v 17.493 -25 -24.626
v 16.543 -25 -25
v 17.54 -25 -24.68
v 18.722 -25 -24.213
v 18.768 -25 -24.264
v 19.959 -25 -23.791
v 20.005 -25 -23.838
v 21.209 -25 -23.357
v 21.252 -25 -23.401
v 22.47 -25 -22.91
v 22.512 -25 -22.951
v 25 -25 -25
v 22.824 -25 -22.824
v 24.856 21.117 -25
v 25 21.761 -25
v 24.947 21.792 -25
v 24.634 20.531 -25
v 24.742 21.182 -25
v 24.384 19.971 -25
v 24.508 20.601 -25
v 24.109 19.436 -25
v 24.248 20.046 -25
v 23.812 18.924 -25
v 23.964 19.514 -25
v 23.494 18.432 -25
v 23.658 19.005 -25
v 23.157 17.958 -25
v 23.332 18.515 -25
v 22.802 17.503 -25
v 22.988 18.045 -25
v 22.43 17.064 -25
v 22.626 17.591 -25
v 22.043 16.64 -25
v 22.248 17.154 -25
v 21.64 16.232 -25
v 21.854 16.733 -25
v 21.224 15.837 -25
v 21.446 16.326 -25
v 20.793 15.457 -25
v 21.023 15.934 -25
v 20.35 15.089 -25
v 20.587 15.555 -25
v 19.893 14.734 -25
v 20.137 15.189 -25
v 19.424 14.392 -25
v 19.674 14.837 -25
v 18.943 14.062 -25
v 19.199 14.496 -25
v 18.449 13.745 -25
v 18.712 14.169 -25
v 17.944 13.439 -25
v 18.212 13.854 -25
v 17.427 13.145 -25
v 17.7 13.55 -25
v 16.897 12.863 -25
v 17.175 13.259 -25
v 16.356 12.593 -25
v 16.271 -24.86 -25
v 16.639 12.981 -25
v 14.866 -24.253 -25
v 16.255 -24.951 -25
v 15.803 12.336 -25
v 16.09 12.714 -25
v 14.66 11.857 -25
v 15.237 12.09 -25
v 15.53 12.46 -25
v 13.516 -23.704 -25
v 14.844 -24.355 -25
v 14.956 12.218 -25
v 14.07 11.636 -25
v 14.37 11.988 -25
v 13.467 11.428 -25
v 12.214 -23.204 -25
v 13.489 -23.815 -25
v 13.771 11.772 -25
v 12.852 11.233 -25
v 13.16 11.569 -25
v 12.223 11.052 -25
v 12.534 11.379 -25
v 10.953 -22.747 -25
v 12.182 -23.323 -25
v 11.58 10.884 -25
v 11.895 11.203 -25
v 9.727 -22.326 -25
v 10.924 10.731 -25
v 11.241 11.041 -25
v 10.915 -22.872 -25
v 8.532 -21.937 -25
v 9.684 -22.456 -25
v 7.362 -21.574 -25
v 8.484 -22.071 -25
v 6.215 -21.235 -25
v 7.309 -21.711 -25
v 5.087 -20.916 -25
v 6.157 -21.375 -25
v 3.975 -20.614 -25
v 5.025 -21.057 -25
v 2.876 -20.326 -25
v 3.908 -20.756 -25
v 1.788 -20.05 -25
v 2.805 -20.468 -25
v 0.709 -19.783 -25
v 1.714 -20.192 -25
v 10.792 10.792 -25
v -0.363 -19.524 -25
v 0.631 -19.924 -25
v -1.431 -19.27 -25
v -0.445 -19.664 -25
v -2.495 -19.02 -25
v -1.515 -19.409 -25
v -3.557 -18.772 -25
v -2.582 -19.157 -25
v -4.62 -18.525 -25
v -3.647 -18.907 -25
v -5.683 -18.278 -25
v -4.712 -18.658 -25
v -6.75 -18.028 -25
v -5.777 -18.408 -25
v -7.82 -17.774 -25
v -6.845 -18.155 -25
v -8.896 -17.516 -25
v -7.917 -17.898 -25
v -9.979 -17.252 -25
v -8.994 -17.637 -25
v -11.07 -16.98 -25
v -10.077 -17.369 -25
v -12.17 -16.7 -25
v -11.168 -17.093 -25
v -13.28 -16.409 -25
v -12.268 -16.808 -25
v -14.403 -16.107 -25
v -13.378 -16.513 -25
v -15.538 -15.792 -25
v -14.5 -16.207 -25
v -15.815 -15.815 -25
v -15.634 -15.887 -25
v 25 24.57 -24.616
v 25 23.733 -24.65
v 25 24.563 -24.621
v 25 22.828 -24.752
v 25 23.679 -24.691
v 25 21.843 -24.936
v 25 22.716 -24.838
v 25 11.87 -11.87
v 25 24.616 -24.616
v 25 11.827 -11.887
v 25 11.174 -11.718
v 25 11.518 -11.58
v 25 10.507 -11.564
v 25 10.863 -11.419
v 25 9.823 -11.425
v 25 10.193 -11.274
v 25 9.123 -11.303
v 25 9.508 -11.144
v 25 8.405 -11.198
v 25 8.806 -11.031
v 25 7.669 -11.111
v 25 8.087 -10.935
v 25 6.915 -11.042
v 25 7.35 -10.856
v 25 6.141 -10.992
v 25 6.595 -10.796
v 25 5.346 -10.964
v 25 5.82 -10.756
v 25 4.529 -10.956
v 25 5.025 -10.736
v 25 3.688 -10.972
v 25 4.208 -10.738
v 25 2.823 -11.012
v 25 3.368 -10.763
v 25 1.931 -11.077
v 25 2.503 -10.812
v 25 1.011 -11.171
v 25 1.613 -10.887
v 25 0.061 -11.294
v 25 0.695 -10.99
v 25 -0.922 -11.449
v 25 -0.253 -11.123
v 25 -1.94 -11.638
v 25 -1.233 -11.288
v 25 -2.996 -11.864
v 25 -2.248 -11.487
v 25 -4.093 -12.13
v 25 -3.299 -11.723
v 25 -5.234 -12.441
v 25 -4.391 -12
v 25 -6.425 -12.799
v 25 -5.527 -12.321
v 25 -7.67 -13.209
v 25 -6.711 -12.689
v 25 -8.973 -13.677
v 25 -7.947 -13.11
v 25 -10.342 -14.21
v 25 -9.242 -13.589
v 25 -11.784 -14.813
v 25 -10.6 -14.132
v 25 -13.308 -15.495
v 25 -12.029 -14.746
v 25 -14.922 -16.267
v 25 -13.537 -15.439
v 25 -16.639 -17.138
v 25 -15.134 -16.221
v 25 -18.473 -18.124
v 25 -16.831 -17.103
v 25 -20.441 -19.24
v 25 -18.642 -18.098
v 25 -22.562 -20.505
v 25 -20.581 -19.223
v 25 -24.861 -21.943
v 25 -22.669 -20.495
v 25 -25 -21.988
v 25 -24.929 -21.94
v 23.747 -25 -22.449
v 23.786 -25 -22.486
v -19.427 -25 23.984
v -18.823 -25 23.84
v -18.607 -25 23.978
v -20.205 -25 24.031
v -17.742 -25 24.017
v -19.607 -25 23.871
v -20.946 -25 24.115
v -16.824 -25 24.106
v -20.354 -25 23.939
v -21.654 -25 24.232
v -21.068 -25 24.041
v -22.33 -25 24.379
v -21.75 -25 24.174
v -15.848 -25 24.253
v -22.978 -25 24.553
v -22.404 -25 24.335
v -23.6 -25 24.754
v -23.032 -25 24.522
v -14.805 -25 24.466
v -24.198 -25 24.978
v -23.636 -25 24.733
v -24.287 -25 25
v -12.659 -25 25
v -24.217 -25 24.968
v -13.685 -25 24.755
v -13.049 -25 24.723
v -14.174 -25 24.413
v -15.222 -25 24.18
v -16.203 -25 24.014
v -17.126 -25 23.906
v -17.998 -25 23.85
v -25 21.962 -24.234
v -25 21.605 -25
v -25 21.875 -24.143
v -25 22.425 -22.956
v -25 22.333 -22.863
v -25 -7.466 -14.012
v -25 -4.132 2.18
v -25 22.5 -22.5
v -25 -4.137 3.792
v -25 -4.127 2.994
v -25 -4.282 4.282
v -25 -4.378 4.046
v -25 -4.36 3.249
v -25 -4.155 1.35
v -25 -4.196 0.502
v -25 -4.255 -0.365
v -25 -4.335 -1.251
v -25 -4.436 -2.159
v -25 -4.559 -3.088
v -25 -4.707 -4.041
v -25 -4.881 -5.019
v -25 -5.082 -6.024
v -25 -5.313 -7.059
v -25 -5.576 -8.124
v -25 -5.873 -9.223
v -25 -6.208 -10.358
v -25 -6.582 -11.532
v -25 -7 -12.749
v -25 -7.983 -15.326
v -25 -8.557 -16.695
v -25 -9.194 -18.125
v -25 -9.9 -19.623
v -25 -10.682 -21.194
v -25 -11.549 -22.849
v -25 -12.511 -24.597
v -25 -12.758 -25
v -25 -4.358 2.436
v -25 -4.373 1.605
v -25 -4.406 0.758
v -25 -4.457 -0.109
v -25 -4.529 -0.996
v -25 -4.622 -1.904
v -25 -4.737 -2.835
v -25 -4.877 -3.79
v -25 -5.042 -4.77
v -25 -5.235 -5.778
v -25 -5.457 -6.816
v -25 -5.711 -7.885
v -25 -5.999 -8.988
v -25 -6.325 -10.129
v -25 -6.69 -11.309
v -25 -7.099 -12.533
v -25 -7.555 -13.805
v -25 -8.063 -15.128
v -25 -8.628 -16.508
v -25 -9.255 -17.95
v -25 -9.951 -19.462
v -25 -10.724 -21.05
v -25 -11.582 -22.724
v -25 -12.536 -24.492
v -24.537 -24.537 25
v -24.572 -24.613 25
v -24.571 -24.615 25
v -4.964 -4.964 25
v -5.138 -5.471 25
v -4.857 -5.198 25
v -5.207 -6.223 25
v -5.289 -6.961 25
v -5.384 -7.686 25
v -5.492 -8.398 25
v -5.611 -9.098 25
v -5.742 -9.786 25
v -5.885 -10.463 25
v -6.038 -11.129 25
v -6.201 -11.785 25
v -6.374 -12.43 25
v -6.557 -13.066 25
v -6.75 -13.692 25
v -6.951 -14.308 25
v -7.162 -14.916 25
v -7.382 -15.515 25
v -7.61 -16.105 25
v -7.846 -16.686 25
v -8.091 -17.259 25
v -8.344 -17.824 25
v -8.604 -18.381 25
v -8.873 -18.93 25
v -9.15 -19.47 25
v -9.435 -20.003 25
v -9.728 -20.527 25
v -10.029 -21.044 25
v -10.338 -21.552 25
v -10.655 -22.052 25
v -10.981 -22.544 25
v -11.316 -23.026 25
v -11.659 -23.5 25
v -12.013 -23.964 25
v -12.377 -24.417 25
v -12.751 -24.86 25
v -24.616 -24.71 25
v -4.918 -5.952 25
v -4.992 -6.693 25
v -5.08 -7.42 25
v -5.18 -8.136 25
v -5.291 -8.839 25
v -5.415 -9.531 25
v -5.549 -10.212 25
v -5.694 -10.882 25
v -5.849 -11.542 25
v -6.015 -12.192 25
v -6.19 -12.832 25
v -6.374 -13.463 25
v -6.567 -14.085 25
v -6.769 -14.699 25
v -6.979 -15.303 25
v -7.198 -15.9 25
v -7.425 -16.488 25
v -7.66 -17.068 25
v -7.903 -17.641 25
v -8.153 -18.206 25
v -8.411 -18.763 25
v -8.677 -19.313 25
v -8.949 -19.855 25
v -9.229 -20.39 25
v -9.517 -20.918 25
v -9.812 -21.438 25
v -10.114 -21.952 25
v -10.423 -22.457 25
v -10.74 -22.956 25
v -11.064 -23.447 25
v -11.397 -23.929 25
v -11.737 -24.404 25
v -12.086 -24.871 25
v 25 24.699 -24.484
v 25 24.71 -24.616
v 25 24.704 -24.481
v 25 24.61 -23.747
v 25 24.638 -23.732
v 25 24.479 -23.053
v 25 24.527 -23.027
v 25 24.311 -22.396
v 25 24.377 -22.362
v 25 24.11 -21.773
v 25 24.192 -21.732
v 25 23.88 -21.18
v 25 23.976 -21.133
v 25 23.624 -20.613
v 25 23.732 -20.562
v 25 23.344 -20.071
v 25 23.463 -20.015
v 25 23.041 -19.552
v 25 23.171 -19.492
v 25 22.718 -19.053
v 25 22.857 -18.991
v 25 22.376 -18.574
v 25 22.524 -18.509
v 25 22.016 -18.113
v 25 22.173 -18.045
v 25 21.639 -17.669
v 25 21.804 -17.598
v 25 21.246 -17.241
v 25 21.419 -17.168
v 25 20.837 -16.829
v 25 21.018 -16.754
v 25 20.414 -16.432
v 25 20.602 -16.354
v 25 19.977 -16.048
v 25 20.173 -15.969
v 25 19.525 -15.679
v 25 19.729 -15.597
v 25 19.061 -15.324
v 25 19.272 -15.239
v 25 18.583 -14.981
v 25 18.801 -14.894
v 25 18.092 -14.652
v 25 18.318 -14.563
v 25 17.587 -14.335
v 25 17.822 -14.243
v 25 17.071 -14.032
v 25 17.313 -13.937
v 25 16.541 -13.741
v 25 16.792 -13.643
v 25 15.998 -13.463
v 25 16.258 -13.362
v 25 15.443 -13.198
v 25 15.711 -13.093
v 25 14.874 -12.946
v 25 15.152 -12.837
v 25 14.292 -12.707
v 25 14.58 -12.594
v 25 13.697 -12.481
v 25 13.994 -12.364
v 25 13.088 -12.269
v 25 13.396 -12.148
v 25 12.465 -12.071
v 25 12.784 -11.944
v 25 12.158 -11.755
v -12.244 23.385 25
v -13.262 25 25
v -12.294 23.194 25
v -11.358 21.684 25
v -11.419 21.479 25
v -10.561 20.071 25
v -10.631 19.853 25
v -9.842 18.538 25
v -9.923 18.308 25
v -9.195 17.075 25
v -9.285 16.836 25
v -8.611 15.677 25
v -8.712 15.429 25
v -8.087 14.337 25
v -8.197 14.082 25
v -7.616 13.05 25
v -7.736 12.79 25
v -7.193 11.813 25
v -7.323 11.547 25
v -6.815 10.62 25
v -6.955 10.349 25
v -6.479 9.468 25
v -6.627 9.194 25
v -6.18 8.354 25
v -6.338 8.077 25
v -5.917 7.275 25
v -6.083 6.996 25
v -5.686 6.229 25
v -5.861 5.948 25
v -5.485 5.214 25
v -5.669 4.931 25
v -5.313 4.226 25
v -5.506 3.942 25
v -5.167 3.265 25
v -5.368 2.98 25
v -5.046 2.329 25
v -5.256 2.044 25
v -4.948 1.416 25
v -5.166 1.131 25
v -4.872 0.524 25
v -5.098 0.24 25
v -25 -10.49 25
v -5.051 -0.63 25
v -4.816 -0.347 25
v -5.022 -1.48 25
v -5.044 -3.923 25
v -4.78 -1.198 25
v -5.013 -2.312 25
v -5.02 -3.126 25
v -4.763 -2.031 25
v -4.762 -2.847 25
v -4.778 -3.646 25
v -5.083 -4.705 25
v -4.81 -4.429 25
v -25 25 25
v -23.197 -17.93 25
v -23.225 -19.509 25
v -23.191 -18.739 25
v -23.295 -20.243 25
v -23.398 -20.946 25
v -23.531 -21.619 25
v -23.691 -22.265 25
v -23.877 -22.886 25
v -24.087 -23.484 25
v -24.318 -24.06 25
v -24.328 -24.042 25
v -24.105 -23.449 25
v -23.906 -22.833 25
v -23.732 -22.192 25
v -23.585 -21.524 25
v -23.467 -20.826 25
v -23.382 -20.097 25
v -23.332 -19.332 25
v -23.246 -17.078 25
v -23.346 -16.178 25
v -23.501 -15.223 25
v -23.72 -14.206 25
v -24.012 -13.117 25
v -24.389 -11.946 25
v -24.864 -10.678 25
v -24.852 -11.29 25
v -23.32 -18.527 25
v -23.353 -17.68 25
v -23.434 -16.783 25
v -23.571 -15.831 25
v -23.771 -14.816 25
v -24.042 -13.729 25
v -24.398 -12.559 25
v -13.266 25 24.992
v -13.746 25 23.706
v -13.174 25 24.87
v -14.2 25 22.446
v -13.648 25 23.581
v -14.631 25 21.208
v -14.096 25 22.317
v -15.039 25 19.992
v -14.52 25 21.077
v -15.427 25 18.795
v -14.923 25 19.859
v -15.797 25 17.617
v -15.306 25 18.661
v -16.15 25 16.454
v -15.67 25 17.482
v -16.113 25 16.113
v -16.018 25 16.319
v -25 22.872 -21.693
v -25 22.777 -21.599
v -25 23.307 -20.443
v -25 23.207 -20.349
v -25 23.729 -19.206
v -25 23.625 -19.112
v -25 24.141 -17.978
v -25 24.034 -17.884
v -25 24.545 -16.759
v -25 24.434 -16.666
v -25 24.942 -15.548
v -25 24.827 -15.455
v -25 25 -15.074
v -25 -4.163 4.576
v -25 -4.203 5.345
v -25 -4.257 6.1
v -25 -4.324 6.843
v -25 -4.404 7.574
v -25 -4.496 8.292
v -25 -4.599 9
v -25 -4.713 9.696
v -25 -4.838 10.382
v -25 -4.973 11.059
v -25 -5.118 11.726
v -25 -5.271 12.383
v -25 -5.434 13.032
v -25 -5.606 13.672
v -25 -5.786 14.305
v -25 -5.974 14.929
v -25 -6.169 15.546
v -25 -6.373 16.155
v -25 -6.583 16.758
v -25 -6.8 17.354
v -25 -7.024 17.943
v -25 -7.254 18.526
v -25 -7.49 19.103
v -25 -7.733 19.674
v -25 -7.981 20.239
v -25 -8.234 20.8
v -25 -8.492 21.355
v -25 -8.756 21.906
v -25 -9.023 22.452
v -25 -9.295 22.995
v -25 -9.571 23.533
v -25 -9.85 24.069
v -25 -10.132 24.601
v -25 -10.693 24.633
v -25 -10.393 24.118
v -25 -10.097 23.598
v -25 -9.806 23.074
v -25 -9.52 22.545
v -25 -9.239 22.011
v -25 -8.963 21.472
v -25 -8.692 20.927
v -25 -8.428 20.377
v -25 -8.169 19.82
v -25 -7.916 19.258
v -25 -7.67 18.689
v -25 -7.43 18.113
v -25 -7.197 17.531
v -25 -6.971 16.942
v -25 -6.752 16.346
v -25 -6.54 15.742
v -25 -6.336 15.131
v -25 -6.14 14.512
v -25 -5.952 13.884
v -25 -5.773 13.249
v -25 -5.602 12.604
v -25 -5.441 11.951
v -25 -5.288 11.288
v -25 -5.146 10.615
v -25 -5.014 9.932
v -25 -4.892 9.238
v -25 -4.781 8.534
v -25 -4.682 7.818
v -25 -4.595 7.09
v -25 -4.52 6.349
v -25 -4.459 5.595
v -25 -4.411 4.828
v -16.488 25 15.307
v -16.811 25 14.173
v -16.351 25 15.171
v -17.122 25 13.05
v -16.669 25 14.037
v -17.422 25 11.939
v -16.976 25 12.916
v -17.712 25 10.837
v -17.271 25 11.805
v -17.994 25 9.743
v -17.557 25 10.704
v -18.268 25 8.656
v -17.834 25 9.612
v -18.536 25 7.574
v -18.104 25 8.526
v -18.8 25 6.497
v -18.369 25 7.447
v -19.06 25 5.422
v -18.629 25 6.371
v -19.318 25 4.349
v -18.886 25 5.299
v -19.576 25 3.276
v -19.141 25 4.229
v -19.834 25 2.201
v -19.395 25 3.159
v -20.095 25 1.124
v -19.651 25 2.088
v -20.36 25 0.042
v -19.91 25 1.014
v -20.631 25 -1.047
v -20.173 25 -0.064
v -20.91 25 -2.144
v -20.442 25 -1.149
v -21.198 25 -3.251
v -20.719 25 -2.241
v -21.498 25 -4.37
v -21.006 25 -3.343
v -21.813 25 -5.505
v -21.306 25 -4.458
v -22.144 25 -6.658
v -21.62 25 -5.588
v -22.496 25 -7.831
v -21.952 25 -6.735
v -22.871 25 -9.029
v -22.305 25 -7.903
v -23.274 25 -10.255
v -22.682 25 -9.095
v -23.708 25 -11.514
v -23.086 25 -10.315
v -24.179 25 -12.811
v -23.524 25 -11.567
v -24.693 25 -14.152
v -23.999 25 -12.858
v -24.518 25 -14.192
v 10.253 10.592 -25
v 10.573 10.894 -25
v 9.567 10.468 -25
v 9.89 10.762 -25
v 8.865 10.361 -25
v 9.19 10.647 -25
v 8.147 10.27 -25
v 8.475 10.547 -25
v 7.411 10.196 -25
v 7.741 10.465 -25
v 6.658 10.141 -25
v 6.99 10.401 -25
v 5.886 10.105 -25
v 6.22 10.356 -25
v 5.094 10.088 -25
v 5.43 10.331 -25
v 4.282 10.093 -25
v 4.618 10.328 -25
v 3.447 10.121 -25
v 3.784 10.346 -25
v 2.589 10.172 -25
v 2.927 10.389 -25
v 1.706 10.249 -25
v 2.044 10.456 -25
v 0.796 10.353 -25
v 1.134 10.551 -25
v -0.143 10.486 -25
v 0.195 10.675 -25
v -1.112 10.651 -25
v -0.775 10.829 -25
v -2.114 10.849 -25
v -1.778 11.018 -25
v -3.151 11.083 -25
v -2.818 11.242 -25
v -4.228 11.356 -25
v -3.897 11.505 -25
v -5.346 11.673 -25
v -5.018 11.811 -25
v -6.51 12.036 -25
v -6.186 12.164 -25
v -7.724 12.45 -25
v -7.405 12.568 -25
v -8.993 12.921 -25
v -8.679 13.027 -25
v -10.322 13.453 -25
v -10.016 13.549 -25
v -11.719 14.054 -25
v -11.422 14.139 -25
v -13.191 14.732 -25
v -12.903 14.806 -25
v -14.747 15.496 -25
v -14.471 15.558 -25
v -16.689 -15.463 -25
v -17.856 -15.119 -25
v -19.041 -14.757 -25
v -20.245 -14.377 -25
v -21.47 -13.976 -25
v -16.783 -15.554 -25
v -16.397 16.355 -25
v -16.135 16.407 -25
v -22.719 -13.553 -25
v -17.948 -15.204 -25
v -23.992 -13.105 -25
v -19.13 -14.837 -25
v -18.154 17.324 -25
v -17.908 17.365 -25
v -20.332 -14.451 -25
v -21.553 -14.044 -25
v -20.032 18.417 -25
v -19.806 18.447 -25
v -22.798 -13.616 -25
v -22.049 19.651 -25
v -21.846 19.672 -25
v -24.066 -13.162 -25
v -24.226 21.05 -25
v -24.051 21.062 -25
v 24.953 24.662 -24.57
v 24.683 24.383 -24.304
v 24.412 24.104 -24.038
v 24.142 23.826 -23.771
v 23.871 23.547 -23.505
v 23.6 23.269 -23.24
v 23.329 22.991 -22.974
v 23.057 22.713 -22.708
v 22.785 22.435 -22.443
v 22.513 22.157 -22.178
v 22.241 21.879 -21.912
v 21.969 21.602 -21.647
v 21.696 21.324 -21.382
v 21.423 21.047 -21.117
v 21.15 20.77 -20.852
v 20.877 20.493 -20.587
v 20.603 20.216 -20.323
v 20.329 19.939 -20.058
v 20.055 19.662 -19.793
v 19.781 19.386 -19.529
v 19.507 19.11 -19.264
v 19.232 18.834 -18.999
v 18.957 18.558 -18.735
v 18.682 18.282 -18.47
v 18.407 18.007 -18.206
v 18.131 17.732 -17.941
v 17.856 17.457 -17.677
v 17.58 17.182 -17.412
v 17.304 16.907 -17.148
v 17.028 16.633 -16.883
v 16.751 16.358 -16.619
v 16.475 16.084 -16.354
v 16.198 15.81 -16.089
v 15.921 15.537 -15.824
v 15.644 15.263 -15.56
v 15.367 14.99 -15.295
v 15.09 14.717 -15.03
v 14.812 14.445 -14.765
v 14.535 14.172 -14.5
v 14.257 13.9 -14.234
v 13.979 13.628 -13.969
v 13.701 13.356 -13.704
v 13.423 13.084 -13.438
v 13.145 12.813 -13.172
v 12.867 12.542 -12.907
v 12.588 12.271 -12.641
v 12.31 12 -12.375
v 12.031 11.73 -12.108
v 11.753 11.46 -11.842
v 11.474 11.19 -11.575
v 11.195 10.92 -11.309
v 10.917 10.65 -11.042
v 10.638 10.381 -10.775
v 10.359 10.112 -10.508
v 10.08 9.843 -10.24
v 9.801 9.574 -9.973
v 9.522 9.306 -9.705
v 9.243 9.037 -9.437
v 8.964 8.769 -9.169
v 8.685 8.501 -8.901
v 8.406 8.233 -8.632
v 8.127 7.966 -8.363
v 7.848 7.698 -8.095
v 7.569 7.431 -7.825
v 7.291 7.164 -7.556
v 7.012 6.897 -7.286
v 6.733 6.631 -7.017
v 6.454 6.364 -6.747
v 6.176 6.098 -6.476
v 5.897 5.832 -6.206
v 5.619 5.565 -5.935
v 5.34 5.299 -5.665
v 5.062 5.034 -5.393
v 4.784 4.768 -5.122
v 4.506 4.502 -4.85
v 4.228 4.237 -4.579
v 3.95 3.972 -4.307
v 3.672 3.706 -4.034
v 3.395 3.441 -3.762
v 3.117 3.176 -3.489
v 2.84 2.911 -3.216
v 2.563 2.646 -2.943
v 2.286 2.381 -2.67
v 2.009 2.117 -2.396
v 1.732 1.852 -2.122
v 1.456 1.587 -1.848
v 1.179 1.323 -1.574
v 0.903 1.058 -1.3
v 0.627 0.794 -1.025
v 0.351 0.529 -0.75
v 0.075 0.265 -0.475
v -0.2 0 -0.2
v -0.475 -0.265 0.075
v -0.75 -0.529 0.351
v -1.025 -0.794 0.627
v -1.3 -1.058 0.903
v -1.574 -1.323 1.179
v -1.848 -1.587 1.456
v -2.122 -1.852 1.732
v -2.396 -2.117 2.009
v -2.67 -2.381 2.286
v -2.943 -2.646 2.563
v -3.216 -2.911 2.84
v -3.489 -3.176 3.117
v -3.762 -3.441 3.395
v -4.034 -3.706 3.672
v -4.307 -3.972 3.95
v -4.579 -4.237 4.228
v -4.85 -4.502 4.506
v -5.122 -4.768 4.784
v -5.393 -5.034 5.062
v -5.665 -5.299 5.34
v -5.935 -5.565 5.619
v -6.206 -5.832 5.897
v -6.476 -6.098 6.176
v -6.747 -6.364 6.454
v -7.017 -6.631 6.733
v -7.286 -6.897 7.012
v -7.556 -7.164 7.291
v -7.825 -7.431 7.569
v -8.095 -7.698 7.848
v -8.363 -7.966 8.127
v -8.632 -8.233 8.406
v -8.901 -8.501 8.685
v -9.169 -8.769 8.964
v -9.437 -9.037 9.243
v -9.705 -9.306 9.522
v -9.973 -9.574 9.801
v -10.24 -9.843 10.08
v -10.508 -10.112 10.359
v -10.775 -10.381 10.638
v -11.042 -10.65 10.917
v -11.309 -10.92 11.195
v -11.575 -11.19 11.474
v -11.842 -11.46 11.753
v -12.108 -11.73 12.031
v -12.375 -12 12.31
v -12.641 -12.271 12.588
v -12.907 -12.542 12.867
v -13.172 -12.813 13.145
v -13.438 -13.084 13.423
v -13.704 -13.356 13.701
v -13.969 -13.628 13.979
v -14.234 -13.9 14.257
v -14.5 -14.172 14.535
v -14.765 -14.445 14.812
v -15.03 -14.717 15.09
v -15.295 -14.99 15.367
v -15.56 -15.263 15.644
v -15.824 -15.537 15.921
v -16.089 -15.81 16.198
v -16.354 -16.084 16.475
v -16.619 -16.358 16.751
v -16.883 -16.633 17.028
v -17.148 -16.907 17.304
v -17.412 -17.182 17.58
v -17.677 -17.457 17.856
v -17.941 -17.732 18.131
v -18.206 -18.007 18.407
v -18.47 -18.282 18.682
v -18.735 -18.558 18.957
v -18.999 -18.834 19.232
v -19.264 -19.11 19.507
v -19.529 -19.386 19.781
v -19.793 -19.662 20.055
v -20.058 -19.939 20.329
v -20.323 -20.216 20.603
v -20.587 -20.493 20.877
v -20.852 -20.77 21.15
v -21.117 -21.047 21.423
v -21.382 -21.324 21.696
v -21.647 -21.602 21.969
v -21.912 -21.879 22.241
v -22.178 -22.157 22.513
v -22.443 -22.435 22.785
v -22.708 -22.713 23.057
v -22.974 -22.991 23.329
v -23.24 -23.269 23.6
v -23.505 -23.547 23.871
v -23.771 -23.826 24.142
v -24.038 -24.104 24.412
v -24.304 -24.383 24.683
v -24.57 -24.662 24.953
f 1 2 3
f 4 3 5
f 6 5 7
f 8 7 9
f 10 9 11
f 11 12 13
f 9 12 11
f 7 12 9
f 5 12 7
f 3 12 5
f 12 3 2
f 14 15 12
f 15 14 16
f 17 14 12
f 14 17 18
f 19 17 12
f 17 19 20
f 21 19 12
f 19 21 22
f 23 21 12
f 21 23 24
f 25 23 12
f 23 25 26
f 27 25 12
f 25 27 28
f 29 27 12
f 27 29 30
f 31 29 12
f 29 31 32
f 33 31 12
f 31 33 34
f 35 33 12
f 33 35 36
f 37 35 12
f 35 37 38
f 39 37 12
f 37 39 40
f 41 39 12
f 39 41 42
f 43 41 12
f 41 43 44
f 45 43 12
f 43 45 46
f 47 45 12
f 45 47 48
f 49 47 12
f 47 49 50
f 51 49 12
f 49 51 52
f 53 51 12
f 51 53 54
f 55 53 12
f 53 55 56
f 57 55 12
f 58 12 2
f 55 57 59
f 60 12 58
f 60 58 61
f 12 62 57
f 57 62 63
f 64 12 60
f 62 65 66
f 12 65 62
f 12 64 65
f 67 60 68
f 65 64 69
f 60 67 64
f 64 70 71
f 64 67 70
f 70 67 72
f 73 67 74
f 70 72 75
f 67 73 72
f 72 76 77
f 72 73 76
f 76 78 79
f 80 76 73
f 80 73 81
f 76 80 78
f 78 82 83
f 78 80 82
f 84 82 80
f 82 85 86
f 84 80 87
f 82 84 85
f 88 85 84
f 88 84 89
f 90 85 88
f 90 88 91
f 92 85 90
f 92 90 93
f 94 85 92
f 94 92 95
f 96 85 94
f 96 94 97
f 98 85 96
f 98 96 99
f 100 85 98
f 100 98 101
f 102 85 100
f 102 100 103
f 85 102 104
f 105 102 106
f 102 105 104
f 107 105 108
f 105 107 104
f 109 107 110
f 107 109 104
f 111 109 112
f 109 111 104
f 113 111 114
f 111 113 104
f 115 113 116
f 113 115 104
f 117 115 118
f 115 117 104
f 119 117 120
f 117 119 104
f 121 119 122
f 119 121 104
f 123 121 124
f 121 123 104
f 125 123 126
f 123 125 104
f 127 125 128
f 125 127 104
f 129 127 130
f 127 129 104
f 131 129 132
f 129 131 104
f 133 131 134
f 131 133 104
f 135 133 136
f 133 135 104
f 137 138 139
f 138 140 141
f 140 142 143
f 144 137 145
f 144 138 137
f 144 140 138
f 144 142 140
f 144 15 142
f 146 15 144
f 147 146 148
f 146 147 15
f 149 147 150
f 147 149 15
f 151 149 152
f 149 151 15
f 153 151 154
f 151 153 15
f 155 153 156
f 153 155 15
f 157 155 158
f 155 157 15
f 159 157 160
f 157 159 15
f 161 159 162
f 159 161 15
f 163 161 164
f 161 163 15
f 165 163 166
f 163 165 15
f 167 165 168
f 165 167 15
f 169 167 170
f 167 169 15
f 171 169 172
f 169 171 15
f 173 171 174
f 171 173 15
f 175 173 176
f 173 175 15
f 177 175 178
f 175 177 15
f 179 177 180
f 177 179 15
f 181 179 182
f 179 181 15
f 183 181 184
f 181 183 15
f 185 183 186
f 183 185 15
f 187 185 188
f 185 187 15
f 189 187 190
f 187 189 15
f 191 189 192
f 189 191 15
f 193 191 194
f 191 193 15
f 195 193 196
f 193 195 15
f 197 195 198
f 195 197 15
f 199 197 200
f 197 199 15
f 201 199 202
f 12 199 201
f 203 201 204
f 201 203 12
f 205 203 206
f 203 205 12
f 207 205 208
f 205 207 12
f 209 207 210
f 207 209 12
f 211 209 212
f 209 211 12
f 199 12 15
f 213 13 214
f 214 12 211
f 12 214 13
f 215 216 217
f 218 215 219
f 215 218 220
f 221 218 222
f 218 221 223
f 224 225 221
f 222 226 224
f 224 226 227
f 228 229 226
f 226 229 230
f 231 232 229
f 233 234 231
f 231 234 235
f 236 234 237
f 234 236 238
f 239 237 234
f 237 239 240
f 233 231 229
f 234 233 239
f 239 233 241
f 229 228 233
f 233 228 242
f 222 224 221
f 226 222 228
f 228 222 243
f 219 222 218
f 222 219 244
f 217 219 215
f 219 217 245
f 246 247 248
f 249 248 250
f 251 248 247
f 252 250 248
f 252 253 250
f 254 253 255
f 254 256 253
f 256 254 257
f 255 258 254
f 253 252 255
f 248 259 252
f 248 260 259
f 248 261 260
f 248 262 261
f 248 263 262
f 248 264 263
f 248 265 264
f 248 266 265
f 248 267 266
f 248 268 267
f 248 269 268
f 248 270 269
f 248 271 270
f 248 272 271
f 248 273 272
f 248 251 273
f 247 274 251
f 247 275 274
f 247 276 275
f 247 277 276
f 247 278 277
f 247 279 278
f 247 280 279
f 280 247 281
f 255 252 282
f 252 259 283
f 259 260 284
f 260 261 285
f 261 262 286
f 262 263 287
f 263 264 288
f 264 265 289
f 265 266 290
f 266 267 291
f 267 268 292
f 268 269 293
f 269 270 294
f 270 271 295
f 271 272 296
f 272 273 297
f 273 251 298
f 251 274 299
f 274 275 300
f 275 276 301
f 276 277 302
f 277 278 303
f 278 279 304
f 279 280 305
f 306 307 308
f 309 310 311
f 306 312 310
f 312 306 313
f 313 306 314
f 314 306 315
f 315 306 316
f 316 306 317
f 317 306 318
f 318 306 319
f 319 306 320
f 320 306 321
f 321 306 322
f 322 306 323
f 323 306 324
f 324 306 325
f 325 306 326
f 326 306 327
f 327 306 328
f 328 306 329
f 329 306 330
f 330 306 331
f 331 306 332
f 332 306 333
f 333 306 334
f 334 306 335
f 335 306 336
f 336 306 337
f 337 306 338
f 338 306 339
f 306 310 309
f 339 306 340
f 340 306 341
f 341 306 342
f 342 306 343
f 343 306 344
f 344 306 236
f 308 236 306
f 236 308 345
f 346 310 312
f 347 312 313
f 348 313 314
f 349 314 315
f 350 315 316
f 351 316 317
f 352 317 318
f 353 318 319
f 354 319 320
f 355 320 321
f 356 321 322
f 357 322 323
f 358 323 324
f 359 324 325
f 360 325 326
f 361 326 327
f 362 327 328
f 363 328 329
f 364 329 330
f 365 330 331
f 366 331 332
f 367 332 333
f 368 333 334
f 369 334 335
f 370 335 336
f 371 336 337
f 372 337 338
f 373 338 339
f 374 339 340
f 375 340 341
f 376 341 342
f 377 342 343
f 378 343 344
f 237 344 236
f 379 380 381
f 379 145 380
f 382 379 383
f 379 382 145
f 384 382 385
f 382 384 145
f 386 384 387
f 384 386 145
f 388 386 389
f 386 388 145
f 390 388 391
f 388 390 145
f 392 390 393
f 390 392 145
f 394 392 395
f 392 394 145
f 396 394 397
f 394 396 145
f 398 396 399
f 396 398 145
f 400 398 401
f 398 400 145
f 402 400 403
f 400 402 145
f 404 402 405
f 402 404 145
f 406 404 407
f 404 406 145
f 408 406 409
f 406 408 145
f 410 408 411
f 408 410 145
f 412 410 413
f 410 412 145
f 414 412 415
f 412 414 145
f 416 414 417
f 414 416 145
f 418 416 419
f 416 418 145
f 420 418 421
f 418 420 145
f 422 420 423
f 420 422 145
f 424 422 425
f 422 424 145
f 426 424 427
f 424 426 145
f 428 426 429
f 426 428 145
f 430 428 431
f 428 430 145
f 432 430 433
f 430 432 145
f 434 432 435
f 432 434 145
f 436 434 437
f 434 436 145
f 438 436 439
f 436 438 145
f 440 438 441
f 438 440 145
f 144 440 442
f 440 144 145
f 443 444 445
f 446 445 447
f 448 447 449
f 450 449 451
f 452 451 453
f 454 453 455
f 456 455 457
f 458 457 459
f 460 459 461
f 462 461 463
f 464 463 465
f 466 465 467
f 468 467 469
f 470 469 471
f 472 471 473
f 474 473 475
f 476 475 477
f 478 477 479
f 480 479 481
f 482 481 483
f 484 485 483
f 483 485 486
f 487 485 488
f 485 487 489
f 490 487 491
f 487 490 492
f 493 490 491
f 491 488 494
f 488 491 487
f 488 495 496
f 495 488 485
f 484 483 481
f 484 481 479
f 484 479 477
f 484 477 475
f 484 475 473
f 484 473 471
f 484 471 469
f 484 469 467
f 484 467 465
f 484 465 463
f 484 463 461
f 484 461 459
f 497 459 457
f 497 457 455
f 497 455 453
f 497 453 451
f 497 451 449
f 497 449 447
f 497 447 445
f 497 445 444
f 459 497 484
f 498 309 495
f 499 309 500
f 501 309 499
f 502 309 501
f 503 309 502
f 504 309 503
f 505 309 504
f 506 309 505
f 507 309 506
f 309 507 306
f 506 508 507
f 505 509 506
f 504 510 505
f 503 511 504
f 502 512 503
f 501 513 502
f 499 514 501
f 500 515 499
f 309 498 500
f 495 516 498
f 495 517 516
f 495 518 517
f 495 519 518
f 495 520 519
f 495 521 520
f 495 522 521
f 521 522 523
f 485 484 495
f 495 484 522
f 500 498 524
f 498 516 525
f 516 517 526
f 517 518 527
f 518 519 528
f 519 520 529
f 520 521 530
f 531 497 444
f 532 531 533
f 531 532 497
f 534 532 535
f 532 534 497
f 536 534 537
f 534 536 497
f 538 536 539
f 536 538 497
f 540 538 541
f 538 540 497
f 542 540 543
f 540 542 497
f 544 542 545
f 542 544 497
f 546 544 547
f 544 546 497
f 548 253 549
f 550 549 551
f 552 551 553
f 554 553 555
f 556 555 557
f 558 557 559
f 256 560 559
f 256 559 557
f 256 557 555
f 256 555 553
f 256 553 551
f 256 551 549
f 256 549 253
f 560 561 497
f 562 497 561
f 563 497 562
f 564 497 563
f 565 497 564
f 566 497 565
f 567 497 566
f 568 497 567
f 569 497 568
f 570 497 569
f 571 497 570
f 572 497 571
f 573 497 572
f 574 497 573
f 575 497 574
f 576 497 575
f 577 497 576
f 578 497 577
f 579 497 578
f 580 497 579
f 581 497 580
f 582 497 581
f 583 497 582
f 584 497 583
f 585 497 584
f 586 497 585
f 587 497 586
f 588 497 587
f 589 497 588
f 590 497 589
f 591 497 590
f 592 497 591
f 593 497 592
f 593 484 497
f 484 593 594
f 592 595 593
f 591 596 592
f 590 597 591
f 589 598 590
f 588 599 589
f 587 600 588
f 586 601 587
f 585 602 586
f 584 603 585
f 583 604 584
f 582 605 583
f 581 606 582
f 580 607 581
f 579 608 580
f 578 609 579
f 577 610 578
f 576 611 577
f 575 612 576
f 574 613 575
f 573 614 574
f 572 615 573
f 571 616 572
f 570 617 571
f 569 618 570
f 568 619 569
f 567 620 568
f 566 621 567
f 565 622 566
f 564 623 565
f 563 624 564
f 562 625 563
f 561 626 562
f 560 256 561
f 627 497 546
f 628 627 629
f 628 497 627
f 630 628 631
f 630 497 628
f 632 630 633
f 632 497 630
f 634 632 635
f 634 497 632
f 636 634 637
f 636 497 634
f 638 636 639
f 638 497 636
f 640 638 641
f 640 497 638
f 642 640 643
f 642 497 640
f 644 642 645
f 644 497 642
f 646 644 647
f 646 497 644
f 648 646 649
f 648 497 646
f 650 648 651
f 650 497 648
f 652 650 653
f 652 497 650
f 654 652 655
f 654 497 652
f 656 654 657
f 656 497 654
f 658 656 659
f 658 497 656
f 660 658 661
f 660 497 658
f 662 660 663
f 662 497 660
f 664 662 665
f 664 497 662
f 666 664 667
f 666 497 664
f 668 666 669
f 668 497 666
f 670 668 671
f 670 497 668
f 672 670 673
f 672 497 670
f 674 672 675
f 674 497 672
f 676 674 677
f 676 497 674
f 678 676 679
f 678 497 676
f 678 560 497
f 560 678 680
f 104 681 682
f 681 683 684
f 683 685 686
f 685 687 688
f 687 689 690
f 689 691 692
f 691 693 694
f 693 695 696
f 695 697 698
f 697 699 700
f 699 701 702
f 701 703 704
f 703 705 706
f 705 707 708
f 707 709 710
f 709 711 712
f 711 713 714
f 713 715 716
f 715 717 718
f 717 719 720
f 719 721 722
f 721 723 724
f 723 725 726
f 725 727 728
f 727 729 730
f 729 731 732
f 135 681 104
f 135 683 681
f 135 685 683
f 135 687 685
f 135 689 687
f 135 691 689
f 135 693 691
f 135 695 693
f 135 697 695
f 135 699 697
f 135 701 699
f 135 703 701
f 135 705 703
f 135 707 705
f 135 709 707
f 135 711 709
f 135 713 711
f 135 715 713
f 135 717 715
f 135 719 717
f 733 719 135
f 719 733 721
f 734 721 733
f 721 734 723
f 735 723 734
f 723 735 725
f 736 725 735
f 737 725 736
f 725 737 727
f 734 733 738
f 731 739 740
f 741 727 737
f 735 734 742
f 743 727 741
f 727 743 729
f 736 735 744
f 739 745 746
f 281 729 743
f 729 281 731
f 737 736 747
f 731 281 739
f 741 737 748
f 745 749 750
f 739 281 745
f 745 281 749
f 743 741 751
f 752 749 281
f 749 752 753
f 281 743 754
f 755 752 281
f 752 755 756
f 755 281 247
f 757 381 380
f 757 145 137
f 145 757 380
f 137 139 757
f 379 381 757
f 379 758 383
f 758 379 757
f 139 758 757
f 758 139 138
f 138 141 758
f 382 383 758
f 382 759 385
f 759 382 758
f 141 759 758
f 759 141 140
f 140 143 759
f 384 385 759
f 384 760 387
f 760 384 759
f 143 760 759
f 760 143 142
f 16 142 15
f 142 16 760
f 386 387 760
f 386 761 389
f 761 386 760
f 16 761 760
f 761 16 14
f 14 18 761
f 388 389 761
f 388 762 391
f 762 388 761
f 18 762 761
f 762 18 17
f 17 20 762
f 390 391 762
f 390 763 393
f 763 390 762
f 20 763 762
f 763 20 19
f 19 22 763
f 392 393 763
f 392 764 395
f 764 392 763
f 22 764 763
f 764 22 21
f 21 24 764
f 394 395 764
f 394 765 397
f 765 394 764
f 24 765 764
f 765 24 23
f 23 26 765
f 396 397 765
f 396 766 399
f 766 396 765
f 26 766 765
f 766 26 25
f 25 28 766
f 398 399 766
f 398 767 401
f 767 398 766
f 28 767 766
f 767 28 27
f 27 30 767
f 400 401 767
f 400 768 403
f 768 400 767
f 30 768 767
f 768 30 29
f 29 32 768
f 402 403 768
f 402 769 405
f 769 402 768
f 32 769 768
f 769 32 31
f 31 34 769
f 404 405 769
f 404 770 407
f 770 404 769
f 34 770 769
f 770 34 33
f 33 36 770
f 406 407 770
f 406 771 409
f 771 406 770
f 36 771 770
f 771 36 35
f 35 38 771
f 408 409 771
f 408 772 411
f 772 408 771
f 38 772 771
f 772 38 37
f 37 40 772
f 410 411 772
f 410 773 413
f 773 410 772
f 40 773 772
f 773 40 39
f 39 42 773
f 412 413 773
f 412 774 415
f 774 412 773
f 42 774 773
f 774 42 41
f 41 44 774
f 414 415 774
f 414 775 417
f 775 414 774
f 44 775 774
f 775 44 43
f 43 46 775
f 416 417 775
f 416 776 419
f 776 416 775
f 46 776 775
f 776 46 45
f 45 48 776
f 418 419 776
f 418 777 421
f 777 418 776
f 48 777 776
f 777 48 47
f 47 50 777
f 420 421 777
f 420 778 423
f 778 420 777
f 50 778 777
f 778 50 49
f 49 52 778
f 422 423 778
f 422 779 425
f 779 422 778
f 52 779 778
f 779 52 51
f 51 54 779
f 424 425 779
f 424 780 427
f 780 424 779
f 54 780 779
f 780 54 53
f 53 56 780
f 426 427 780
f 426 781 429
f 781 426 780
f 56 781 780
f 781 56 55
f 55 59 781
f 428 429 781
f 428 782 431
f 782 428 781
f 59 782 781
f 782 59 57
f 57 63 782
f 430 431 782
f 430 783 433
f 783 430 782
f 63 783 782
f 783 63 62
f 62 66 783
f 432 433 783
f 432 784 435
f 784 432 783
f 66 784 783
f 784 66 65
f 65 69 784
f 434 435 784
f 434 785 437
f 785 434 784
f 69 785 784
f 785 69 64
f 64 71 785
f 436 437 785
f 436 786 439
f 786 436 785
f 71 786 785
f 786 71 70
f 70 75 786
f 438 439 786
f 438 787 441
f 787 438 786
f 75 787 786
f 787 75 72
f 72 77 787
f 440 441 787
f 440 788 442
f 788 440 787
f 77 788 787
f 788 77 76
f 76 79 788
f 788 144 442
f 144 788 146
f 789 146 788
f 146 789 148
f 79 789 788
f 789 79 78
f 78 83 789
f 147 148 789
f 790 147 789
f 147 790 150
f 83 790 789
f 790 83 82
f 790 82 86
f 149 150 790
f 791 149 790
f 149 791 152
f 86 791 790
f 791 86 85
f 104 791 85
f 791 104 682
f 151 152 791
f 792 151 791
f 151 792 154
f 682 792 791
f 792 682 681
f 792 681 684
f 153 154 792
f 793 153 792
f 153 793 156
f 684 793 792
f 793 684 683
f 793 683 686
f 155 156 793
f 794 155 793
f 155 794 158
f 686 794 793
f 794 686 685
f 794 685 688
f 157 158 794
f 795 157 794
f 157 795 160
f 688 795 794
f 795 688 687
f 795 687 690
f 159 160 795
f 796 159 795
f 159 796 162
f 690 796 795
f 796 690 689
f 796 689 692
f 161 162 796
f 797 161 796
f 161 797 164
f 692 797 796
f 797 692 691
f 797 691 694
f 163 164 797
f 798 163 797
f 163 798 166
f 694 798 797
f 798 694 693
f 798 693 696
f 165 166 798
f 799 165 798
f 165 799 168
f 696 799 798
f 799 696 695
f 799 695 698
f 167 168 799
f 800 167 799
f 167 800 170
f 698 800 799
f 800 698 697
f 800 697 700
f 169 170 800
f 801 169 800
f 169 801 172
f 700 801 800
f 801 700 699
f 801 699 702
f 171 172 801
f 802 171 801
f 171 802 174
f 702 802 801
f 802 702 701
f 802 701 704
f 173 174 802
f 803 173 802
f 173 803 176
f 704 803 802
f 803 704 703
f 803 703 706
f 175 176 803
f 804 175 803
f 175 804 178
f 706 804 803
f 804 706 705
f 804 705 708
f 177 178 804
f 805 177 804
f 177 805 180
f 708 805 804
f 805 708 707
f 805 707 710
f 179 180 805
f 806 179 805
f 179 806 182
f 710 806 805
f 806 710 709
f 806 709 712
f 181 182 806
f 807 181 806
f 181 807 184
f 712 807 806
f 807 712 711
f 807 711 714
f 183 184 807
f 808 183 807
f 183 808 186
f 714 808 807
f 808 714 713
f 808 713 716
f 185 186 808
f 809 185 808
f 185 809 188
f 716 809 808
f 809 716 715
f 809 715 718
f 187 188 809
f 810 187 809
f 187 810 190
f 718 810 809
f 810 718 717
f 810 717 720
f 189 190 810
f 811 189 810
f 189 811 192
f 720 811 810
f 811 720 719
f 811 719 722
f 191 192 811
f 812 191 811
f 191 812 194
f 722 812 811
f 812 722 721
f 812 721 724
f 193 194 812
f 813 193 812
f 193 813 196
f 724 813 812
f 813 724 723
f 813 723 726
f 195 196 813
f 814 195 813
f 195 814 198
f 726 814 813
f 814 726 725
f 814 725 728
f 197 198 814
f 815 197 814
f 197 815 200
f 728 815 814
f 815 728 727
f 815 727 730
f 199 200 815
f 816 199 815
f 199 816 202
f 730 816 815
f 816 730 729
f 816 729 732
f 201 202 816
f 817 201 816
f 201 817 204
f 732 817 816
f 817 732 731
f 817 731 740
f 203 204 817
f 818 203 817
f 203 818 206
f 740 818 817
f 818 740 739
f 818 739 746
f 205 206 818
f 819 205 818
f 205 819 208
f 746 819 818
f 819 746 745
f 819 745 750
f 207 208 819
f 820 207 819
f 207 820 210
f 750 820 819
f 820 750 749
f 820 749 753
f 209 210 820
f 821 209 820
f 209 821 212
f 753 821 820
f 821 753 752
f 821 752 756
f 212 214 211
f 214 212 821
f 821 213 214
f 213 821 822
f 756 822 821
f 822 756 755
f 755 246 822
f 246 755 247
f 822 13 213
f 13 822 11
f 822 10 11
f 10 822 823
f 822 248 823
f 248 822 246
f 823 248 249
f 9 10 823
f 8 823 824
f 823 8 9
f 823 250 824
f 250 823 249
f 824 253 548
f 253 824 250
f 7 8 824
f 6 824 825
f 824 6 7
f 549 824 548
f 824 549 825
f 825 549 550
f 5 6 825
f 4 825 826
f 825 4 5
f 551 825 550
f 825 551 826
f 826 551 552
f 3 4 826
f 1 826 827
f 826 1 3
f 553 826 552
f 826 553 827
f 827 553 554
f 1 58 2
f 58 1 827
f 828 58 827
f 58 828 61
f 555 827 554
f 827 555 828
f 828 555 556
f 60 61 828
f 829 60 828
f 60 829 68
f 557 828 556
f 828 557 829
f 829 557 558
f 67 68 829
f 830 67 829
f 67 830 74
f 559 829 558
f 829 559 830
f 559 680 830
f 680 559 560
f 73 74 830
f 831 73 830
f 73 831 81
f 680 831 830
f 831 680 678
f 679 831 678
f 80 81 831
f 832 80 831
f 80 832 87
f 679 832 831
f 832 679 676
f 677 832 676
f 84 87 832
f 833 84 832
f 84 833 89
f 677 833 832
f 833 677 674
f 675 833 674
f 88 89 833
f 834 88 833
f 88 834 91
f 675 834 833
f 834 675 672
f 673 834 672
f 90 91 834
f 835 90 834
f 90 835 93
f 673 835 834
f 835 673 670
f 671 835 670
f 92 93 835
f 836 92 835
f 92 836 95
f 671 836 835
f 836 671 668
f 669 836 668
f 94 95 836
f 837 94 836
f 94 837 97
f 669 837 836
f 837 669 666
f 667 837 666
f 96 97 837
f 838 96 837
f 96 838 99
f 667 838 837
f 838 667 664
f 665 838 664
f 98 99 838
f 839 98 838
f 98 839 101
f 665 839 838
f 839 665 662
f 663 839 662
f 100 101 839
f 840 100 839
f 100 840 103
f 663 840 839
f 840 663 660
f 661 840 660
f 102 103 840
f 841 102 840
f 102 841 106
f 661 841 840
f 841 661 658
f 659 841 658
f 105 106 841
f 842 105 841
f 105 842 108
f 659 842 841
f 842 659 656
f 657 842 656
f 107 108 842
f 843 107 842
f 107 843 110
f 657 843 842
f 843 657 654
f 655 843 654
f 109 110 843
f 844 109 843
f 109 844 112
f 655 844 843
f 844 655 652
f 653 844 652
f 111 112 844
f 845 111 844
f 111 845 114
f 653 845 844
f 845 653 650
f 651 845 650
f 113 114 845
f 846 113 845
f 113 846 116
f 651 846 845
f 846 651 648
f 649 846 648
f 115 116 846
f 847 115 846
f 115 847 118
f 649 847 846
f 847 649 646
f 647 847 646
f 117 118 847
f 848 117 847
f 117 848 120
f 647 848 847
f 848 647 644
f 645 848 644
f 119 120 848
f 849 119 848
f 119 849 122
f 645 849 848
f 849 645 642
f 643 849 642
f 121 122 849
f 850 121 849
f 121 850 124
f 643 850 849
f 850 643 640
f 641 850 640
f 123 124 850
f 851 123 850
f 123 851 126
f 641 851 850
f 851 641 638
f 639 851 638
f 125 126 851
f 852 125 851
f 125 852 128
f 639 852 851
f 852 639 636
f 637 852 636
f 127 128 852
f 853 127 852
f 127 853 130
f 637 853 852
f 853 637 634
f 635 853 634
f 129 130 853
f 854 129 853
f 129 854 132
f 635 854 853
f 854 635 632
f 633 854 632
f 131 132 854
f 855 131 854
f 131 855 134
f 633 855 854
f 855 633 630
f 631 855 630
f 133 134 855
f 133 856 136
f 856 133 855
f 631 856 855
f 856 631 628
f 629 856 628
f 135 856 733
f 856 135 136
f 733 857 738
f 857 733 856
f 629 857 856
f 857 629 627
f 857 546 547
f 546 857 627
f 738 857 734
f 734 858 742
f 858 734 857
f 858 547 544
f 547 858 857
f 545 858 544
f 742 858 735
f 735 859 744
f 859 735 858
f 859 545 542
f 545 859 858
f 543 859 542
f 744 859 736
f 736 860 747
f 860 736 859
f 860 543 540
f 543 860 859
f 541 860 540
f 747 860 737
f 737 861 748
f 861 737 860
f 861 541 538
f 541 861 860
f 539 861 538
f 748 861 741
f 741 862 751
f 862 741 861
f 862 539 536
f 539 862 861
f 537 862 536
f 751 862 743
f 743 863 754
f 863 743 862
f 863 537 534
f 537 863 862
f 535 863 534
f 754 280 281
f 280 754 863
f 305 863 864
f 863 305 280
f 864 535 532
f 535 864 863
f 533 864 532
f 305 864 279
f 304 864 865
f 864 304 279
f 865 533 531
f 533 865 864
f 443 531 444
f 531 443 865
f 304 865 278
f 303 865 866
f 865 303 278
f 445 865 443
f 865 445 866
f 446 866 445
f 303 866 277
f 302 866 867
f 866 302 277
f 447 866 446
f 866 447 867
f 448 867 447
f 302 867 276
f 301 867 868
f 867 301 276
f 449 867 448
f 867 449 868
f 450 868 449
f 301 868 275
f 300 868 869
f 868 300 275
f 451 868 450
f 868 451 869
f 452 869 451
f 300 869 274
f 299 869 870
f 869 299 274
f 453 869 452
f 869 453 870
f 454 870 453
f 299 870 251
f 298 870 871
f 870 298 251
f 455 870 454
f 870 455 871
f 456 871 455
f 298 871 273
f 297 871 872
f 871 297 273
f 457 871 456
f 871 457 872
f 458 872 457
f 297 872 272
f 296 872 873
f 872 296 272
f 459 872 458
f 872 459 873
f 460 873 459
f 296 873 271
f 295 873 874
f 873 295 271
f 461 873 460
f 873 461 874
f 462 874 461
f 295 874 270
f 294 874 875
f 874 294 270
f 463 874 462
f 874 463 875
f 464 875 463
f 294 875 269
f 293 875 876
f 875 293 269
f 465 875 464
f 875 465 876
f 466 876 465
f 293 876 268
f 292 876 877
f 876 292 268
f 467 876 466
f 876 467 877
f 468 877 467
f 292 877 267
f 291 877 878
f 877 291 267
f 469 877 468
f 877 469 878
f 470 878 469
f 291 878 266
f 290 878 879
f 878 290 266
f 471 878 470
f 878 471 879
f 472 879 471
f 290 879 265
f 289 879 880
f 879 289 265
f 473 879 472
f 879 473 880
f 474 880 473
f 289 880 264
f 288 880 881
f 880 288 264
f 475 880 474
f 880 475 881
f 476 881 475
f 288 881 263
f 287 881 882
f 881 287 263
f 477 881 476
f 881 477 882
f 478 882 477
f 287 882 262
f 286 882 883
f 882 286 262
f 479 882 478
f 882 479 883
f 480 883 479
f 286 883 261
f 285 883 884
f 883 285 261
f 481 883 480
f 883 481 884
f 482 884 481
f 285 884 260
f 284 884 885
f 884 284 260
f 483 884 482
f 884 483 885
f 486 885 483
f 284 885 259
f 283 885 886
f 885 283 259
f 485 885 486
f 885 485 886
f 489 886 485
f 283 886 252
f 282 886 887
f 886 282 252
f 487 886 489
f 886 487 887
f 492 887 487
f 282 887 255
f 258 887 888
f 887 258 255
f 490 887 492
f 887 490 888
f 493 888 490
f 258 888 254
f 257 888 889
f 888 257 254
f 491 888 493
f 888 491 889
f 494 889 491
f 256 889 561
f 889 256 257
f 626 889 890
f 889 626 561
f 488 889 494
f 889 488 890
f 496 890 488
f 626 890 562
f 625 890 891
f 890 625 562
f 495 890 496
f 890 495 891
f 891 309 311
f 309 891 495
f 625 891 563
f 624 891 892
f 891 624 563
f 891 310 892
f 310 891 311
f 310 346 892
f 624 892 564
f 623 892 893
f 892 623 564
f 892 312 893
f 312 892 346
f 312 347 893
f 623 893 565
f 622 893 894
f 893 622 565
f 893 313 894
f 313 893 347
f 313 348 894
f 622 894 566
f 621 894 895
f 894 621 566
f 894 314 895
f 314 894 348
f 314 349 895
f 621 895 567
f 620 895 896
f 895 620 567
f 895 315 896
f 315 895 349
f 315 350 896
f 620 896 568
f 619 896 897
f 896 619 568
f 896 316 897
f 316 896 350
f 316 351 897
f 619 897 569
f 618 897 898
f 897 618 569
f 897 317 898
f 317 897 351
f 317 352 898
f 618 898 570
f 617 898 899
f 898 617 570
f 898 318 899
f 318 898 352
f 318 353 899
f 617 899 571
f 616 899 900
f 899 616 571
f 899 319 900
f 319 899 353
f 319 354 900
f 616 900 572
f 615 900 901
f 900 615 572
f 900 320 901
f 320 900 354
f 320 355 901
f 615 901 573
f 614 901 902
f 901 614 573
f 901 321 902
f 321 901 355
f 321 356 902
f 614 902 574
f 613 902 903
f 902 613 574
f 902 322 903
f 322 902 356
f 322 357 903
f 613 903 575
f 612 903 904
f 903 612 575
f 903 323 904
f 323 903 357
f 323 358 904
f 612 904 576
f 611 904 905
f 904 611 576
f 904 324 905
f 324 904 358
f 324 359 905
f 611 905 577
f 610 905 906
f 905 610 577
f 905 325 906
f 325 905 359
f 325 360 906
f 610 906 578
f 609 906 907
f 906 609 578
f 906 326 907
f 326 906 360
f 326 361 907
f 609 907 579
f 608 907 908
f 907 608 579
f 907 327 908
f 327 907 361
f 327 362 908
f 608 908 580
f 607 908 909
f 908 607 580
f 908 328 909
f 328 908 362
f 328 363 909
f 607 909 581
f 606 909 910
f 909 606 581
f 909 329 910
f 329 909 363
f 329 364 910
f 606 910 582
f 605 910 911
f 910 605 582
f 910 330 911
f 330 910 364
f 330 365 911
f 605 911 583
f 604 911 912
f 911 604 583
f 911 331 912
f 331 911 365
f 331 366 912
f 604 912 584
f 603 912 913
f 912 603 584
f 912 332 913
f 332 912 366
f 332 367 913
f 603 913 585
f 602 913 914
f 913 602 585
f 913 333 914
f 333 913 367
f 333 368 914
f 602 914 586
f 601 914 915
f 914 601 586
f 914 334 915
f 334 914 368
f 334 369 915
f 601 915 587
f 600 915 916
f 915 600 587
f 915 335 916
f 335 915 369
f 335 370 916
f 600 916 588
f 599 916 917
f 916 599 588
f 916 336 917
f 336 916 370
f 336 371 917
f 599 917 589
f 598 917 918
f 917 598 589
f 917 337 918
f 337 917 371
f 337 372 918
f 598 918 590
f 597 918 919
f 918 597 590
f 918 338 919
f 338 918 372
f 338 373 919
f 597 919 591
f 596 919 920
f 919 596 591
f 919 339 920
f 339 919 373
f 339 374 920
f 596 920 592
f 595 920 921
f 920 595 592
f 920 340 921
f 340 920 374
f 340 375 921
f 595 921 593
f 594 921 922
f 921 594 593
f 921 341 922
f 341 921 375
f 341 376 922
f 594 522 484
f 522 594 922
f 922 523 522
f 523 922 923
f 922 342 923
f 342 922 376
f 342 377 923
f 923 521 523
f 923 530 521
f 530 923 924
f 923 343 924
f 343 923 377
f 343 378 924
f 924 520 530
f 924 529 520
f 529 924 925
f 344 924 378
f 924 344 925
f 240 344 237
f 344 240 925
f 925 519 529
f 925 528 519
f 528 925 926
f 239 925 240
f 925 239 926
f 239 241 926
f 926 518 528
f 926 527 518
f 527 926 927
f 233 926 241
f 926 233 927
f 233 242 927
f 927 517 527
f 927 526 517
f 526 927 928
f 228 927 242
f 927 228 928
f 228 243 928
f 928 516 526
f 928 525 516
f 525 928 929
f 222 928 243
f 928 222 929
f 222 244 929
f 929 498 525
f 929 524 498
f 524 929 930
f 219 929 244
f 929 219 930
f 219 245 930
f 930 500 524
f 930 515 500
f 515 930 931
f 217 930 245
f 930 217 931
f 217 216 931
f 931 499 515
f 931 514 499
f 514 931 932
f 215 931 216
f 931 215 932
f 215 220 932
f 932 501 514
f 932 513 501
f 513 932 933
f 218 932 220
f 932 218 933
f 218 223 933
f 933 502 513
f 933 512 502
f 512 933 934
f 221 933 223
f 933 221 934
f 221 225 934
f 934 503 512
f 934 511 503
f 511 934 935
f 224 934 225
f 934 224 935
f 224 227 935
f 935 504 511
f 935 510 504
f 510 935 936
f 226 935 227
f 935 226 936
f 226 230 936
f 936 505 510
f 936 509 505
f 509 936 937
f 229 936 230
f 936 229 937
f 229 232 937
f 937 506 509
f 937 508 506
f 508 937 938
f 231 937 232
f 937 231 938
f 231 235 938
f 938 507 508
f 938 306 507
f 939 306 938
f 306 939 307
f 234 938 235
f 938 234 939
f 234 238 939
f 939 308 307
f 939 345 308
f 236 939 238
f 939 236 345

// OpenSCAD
/* [Global] */

//size of the cube (mm)
edge = 50; //[10.0:100.0]

// angle in degrees you'll have to screw the pieces to assemble the cube
twist_angle = 330; //[300:720]

// size of the gap between pieces (mm)
epsilon = 0.4; //[0.0,0.05,0.1,0.15,0.2,0.3,0.4,0.5]


/* [Hidden] */
angle = atan(1/sqrt(2));
diag = edge*sqrt(3);
d = diag/2;

module piece(){
	  intersection(){
		 rotate ([45,angle,30])cube( [edge,edge,edge],center = true);
		translate([0, 0, -diag/2]) linear_extrude(height = diag, center = false, convexity = 10, twist = twist_angle, $fn = 200)
		polygon( points=[[0+epsilon/2,0+epsilon/2],[d+epsilon,-tan(30-epsilon)*d],[d,d],[0+epsilon/2,d]] );
	}
}



rotate ([45,0,-0]) rotate ([-0,-angle,-0]) rotate ([-0,-0,-30])color("blue")piece ();

// remove * to get the complete cube
*rotate ([45,0,-0]) rotate ([-0,-angle,-0]) rotate ([-0,-0,-30]) rotate([0,0,120,]) color("red")piece ("red");

*rotate ([45,0,-0]) rotate ([-0,-angle,-0]) rotate ([-0,-0,-30]) rotate([0,0,240,]) color("green")piece ();
